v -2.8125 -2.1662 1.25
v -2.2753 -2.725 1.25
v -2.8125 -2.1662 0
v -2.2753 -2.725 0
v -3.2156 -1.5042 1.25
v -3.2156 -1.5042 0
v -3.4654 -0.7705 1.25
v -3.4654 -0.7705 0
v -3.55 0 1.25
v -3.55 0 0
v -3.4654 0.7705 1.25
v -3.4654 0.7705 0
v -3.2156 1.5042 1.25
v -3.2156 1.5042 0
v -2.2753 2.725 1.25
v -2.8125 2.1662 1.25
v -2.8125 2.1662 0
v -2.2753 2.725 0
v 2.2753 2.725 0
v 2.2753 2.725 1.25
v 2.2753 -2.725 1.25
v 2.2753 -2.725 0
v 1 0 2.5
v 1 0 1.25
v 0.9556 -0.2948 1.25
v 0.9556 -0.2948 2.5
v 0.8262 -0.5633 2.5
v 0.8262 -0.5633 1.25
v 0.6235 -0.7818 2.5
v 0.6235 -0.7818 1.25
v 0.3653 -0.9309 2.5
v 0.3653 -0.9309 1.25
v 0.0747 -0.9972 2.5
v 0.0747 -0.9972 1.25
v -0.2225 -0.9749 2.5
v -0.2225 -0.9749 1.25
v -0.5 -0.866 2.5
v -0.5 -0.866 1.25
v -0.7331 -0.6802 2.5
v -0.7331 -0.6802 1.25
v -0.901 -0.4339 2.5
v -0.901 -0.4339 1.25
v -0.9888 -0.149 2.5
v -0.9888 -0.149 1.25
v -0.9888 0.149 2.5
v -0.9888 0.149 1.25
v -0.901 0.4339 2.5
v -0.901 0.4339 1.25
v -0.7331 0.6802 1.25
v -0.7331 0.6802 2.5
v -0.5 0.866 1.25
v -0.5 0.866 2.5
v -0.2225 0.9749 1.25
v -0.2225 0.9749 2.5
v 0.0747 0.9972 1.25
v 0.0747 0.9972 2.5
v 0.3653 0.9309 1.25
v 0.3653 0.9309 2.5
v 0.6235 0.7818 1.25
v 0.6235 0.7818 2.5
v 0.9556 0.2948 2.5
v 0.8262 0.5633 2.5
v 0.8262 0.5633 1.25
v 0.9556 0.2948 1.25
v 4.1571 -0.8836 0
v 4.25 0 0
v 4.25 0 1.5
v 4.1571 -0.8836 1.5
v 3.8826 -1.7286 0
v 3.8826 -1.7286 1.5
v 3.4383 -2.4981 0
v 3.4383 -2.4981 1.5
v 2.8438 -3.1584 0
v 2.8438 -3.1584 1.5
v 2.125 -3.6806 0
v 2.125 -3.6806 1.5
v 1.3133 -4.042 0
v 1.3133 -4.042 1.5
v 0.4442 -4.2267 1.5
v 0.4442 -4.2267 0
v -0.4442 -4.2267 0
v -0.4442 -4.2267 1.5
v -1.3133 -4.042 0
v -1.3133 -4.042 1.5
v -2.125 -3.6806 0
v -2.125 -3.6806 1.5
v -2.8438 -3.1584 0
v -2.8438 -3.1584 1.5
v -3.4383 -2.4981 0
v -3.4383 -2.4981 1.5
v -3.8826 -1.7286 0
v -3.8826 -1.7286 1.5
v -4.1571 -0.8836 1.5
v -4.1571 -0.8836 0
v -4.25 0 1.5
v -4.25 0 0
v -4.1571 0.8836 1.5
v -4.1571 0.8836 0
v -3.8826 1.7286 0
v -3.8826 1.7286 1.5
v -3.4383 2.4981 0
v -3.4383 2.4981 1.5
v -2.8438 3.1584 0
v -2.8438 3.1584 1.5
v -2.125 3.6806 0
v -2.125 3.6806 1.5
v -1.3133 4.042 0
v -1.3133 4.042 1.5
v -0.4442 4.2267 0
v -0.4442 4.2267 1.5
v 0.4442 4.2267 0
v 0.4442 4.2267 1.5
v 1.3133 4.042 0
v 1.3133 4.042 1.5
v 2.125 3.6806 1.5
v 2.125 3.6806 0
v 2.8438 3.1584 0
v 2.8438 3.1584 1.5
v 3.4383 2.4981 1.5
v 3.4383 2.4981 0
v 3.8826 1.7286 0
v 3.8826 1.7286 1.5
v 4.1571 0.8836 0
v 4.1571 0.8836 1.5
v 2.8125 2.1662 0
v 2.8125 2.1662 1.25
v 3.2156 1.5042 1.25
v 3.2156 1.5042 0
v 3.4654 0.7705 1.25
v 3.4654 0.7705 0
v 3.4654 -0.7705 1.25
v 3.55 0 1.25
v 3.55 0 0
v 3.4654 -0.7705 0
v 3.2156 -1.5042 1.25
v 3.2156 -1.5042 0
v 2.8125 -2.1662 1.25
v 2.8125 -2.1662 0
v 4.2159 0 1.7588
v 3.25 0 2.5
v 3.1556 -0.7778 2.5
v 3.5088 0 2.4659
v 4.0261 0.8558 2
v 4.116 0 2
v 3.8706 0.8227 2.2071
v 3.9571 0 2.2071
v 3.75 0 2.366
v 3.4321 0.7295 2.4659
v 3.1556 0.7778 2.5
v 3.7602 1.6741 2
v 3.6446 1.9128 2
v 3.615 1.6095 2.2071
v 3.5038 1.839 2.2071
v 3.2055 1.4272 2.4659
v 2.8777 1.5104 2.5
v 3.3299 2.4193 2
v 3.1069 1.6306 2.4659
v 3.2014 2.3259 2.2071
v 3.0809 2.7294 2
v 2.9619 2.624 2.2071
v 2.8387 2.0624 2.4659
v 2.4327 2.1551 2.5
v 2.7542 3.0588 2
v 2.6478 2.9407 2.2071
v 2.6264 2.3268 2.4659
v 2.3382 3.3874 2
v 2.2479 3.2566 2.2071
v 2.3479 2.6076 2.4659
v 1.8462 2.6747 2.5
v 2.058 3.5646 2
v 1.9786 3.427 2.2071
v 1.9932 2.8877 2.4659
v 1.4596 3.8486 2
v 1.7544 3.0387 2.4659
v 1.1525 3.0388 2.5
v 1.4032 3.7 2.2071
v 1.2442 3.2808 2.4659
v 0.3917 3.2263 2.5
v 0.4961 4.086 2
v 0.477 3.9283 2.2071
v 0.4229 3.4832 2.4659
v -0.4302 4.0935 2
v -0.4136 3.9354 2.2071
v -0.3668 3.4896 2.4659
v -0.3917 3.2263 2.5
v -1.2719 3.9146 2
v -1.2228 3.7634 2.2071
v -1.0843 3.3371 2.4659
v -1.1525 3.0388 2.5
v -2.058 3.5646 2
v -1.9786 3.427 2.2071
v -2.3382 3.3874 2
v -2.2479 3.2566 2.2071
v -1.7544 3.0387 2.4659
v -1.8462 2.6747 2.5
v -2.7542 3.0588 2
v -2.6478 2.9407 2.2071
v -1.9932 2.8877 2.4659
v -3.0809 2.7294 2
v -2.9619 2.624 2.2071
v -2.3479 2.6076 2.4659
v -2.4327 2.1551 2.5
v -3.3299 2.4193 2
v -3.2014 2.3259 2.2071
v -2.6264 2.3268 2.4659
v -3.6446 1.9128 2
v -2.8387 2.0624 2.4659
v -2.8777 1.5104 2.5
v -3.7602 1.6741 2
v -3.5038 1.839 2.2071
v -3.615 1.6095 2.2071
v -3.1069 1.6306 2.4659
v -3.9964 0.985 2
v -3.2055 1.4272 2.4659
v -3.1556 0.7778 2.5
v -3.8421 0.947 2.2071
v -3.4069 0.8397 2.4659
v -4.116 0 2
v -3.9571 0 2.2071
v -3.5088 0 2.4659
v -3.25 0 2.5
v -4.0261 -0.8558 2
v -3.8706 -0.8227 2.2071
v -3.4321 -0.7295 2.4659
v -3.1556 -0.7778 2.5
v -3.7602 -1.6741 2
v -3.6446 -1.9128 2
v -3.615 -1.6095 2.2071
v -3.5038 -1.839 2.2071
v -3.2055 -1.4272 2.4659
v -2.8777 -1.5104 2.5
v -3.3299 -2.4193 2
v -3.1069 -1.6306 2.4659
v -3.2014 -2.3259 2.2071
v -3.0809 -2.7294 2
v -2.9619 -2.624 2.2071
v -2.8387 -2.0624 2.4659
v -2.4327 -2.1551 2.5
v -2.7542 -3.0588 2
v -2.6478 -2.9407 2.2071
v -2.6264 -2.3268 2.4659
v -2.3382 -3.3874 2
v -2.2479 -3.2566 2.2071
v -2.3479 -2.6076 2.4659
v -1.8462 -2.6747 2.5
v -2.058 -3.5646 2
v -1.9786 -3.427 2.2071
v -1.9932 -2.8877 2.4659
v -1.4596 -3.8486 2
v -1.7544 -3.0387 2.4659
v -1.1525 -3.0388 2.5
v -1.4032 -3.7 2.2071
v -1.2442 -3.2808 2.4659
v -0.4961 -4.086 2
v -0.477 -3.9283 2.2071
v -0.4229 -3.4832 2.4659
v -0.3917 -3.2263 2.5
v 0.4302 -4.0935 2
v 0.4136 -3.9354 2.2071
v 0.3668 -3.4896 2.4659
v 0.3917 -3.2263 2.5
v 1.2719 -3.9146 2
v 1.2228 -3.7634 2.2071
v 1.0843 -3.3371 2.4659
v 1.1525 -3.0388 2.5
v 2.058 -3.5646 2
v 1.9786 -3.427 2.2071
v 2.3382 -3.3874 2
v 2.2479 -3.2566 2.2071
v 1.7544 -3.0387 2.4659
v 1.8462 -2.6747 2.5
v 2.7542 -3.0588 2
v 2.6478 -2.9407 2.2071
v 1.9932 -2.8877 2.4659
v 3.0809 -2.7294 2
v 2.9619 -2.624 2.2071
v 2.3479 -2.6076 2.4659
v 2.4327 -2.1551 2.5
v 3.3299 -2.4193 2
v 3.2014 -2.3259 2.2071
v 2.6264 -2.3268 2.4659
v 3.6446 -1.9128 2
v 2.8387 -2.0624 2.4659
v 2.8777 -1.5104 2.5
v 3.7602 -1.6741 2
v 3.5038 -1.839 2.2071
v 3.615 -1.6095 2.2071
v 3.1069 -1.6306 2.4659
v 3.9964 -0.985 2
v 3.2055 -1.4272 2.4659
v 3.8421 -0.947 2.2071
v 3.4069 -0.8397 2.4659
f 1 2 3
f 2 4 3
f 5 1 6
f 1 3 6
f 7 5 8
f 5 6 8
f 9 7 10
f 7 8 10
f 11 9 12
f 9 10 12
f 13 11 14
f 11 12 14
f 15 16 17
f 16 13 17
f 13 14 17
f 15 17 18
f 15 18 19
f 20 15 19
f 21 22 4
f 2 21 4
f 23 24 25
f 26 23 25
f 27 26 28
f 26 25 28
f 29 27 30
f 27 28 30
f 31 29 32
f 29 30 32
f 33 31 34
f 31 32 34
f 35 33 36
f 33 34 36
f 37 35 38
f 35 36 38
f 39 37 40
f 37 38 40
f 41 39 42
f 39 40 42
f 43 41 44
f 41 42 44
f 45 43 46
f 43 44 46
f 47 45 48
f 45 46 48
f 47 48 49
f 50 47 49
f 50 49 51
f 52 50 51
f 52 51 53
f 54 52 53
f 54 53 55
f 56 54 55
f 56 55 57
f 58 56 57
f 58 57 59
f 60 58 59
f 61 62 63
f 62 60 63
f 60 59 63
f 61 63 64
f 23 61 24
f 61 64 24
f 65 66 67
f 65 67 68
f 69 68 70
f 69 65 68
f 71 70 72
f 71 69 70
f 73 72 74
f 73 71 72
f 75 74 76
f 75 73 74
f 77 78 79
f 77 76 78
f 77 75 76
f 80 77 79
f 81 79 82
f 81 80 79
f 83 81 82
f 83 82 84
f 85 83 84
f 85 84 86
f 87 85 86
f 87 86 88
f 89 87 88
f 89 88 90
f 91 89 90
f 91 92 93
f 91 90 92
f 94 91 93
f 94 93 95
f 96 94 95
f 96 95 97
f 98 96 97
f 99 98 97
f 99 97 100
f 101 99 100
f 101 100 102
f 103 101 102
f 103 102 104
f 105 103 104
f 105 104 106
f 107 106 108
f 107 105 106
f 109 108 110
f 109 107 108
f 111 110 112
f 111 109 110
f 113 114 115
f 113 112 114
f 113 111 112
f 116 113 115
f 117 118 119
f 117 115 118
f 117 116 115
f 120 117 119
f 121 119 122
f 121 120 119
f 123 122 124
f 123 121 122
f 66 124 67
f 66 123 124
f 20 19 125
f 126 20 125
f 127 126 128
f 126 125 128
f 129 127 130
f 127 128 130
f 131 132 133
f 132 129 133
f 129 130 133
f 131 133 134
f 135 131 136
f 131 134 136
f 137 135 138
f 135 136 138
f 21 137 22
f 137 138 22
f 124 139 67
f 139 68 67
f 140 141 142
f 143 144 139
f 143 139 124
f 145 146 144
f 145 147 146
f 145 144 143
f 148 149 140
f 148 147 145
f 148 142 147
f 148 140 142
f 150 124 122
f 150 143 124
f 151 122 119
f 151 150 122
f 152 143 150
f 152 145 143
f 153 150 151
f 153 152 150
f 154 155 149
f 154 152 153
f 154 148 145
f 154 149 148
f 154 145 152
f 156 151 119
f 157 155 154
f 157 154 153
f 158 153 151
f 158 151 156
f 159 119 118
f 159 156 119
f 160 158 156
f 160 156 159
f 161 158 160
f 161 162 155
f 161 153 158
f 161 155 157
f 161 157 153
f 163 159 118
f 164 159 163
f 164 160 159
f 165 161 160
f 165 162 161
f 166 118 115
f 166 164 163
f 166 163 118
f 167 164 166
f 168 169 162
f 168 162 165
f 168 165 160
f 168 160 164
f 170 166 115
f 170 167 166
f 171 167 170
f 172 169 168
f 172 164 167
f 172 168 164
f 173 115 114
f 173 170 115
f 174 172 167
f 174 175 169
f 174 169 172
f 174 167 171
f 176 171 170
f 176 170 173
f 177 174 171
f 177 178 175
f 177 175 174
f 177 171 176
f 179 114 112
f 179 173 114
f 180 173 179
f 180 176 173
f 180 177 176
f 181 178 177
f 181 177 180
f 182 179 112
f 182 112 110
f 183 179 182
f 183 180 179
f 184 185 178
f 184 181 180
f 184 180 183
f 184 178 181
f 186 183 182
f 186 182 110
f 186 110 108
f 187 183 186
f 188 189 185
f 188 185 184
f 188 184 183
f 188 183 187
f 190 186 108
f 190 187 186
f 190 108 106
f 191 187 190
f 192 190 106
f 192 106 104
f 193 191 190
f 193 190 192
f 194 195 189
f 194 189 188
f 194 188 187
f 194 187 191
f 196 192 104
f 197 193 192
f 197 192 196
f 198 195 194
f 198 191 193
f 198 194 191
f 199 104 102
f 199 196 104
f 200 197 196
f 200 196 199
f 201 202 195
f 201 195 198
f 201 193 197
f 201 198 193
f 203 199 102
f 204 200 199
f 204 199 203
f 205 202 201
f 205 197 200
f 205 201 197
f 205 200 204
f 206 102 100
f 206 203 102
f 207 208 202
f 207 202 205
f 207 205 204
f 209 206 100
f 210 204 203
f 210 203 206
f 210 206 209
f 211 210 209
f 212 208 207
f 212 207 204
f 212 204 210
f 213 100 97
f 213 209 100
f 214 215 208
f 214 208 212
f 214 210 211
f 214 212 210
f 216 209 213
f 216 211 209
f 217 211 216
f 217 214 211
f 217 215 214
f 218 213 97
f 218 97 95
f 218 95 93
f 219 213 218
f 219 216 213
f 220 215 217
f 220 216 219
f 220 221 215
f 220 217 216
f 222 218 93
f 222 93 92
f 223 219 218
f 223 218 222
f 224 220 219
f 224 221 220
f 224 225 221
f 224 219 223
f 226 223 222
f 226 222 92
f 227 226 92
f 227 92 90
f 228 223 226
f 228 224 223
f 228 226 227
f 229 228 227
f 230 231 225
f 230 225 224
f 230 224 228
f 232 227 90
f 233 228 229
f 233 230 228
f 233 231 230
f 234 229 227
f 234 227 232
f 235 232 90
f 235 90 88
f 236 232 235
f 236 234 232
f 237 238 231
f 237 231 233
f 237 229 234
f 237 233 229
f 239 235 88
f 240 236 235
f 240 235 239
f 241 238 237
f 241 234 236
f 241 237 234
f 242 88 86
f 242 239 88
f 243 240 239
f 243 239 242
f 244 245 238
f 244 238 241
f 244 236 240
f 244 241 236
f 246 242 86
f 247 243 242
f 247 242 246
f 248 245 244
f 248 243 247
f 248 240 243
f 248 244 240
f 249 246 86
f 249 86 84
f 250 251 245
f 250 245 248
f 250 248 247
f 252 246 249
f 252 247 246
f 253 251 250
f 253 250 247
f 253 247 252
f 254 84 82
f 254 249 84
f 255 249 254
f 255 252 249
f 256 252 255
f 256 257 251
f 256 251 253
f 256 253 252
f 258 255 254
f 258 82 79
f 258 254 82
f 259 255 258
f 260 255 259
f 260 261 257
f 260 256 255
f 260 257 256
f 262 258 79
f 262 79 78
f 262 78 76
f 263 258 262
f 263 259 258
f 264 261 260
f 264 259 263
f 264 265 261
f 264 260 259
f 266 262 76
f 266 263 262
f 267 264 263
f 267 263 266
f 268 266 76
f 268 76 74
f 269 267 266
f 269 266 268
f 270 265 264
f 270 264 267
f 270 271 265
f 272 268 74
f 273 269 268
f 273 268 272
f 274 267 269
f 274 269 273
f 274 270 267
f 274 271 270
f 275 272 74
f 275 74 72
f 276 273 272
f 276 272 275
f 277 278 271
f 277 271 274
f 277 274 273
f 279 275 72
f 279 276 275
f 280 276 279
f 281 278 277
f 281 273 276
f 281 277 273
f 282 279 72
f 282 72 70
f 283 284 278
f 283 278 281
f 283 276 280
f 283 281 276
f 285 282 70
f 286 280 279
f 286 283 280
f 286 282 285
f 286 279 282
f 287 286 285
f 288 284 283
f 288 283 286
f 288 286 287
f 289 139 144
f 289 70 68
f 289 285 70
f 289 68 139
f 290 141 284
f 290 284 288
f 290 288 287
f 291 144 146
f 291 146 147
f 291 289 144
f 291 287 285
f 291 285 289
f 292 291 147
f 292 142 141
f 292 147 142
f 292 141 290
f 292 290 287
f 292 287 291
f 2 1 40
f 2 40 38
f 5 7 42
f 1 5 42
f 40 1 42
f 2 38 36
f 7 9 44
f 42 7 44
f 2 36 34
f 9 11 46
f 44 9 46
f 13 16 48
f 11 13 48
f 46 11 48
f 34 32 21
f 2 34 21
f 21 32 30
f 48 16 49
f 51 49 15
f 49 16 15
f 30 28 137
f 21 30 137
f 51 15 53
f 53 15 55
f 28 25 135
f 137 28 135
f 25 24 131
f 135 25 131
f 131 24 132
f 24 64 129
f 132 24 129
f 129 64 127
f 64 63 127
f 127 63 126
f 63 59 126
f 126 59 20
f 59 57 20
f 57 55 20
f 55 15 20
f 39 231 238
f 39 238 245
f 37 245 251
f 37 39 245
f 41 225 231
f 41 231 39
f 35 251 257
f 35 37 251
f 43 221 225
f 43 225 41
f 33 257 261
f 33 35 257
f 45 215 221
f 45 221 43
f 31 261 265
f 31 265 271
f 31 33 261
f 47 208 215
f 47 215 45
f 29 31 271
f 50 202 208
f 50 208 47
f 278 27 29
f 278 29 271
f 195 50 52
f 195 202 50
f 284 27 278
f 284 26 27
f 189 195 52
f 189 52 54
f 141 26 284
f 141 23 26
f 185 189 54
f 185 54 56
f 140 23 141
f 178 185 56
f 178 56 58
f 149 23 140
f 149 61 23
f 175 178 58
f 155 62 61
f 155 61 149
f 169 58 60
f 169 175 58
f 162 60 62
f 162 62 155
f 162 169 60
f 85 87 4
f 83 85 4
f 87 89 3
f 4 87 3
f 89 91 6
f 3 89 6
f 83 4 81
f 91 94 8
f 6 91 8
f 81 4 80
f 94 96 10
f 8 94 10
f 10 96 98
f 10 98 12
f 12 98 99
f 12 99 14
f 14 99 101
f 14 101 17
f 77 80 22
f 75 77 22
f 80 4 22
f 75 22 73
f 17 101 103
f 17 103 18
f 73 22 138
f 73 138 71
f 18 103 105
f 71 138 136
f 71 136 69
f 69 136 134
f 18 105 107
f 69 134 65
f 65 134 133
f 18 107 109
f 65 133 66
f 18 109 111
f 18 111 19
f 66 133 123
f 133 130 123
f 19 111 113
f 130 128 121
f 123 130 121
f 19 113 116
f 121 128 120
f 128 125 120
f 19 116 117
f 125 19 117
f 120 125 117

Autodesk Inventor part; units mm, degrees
ref_plane "YZ Plane" through (0, 0, 0) normal (1, 0, 0) x (0, 1, 0)
ref_plane "XZ Plane" through (0, 0, 0) normal (0, 1, 0) x (-1, 0, 0)
ref_plane "XY Plane" through (0, 0, 0) normal (0, 0, 1) x (1, 0, 0)
sketch "Sketch1" plane through (0, 0, 0) normal (0, 0, 1) x (1, 0, 0)
  circle A0 centre (0, 0) radius 3.55
  line L0 (-2.2753, 2.725) -> (2.2753, 2.725)
  line L1 (2.2753, -2.725) -> (-2.2753, -2.725)
  circle A1 centre (0, 0) radius 4.25
  dimension "d0" = 7.1
  dimension "d1" = 5.45
  dimension "d2" = 8.5
extrude "Extrusion1" add sketch "Sketch1" along normal blind 1.25 contours L0 A0 | A0 L1 | A1
sketch "Sketch4" plane through (0, 0, 1.25) normal (0, 0, 1) x (1, 0, 0)
  circle A0 centre (0, 0) radius 4.25 projected
  circle A1 centre (0, 0) radius 1
  dimension "d7" = 2
extrude "Extrusion2" add sketch "Sketch4" along normal blind 1.25
fillet "Fillet1" radius 1 1 edges at (-4.25, 0, 2.5)
properties part number "EncoderV2CAP"
